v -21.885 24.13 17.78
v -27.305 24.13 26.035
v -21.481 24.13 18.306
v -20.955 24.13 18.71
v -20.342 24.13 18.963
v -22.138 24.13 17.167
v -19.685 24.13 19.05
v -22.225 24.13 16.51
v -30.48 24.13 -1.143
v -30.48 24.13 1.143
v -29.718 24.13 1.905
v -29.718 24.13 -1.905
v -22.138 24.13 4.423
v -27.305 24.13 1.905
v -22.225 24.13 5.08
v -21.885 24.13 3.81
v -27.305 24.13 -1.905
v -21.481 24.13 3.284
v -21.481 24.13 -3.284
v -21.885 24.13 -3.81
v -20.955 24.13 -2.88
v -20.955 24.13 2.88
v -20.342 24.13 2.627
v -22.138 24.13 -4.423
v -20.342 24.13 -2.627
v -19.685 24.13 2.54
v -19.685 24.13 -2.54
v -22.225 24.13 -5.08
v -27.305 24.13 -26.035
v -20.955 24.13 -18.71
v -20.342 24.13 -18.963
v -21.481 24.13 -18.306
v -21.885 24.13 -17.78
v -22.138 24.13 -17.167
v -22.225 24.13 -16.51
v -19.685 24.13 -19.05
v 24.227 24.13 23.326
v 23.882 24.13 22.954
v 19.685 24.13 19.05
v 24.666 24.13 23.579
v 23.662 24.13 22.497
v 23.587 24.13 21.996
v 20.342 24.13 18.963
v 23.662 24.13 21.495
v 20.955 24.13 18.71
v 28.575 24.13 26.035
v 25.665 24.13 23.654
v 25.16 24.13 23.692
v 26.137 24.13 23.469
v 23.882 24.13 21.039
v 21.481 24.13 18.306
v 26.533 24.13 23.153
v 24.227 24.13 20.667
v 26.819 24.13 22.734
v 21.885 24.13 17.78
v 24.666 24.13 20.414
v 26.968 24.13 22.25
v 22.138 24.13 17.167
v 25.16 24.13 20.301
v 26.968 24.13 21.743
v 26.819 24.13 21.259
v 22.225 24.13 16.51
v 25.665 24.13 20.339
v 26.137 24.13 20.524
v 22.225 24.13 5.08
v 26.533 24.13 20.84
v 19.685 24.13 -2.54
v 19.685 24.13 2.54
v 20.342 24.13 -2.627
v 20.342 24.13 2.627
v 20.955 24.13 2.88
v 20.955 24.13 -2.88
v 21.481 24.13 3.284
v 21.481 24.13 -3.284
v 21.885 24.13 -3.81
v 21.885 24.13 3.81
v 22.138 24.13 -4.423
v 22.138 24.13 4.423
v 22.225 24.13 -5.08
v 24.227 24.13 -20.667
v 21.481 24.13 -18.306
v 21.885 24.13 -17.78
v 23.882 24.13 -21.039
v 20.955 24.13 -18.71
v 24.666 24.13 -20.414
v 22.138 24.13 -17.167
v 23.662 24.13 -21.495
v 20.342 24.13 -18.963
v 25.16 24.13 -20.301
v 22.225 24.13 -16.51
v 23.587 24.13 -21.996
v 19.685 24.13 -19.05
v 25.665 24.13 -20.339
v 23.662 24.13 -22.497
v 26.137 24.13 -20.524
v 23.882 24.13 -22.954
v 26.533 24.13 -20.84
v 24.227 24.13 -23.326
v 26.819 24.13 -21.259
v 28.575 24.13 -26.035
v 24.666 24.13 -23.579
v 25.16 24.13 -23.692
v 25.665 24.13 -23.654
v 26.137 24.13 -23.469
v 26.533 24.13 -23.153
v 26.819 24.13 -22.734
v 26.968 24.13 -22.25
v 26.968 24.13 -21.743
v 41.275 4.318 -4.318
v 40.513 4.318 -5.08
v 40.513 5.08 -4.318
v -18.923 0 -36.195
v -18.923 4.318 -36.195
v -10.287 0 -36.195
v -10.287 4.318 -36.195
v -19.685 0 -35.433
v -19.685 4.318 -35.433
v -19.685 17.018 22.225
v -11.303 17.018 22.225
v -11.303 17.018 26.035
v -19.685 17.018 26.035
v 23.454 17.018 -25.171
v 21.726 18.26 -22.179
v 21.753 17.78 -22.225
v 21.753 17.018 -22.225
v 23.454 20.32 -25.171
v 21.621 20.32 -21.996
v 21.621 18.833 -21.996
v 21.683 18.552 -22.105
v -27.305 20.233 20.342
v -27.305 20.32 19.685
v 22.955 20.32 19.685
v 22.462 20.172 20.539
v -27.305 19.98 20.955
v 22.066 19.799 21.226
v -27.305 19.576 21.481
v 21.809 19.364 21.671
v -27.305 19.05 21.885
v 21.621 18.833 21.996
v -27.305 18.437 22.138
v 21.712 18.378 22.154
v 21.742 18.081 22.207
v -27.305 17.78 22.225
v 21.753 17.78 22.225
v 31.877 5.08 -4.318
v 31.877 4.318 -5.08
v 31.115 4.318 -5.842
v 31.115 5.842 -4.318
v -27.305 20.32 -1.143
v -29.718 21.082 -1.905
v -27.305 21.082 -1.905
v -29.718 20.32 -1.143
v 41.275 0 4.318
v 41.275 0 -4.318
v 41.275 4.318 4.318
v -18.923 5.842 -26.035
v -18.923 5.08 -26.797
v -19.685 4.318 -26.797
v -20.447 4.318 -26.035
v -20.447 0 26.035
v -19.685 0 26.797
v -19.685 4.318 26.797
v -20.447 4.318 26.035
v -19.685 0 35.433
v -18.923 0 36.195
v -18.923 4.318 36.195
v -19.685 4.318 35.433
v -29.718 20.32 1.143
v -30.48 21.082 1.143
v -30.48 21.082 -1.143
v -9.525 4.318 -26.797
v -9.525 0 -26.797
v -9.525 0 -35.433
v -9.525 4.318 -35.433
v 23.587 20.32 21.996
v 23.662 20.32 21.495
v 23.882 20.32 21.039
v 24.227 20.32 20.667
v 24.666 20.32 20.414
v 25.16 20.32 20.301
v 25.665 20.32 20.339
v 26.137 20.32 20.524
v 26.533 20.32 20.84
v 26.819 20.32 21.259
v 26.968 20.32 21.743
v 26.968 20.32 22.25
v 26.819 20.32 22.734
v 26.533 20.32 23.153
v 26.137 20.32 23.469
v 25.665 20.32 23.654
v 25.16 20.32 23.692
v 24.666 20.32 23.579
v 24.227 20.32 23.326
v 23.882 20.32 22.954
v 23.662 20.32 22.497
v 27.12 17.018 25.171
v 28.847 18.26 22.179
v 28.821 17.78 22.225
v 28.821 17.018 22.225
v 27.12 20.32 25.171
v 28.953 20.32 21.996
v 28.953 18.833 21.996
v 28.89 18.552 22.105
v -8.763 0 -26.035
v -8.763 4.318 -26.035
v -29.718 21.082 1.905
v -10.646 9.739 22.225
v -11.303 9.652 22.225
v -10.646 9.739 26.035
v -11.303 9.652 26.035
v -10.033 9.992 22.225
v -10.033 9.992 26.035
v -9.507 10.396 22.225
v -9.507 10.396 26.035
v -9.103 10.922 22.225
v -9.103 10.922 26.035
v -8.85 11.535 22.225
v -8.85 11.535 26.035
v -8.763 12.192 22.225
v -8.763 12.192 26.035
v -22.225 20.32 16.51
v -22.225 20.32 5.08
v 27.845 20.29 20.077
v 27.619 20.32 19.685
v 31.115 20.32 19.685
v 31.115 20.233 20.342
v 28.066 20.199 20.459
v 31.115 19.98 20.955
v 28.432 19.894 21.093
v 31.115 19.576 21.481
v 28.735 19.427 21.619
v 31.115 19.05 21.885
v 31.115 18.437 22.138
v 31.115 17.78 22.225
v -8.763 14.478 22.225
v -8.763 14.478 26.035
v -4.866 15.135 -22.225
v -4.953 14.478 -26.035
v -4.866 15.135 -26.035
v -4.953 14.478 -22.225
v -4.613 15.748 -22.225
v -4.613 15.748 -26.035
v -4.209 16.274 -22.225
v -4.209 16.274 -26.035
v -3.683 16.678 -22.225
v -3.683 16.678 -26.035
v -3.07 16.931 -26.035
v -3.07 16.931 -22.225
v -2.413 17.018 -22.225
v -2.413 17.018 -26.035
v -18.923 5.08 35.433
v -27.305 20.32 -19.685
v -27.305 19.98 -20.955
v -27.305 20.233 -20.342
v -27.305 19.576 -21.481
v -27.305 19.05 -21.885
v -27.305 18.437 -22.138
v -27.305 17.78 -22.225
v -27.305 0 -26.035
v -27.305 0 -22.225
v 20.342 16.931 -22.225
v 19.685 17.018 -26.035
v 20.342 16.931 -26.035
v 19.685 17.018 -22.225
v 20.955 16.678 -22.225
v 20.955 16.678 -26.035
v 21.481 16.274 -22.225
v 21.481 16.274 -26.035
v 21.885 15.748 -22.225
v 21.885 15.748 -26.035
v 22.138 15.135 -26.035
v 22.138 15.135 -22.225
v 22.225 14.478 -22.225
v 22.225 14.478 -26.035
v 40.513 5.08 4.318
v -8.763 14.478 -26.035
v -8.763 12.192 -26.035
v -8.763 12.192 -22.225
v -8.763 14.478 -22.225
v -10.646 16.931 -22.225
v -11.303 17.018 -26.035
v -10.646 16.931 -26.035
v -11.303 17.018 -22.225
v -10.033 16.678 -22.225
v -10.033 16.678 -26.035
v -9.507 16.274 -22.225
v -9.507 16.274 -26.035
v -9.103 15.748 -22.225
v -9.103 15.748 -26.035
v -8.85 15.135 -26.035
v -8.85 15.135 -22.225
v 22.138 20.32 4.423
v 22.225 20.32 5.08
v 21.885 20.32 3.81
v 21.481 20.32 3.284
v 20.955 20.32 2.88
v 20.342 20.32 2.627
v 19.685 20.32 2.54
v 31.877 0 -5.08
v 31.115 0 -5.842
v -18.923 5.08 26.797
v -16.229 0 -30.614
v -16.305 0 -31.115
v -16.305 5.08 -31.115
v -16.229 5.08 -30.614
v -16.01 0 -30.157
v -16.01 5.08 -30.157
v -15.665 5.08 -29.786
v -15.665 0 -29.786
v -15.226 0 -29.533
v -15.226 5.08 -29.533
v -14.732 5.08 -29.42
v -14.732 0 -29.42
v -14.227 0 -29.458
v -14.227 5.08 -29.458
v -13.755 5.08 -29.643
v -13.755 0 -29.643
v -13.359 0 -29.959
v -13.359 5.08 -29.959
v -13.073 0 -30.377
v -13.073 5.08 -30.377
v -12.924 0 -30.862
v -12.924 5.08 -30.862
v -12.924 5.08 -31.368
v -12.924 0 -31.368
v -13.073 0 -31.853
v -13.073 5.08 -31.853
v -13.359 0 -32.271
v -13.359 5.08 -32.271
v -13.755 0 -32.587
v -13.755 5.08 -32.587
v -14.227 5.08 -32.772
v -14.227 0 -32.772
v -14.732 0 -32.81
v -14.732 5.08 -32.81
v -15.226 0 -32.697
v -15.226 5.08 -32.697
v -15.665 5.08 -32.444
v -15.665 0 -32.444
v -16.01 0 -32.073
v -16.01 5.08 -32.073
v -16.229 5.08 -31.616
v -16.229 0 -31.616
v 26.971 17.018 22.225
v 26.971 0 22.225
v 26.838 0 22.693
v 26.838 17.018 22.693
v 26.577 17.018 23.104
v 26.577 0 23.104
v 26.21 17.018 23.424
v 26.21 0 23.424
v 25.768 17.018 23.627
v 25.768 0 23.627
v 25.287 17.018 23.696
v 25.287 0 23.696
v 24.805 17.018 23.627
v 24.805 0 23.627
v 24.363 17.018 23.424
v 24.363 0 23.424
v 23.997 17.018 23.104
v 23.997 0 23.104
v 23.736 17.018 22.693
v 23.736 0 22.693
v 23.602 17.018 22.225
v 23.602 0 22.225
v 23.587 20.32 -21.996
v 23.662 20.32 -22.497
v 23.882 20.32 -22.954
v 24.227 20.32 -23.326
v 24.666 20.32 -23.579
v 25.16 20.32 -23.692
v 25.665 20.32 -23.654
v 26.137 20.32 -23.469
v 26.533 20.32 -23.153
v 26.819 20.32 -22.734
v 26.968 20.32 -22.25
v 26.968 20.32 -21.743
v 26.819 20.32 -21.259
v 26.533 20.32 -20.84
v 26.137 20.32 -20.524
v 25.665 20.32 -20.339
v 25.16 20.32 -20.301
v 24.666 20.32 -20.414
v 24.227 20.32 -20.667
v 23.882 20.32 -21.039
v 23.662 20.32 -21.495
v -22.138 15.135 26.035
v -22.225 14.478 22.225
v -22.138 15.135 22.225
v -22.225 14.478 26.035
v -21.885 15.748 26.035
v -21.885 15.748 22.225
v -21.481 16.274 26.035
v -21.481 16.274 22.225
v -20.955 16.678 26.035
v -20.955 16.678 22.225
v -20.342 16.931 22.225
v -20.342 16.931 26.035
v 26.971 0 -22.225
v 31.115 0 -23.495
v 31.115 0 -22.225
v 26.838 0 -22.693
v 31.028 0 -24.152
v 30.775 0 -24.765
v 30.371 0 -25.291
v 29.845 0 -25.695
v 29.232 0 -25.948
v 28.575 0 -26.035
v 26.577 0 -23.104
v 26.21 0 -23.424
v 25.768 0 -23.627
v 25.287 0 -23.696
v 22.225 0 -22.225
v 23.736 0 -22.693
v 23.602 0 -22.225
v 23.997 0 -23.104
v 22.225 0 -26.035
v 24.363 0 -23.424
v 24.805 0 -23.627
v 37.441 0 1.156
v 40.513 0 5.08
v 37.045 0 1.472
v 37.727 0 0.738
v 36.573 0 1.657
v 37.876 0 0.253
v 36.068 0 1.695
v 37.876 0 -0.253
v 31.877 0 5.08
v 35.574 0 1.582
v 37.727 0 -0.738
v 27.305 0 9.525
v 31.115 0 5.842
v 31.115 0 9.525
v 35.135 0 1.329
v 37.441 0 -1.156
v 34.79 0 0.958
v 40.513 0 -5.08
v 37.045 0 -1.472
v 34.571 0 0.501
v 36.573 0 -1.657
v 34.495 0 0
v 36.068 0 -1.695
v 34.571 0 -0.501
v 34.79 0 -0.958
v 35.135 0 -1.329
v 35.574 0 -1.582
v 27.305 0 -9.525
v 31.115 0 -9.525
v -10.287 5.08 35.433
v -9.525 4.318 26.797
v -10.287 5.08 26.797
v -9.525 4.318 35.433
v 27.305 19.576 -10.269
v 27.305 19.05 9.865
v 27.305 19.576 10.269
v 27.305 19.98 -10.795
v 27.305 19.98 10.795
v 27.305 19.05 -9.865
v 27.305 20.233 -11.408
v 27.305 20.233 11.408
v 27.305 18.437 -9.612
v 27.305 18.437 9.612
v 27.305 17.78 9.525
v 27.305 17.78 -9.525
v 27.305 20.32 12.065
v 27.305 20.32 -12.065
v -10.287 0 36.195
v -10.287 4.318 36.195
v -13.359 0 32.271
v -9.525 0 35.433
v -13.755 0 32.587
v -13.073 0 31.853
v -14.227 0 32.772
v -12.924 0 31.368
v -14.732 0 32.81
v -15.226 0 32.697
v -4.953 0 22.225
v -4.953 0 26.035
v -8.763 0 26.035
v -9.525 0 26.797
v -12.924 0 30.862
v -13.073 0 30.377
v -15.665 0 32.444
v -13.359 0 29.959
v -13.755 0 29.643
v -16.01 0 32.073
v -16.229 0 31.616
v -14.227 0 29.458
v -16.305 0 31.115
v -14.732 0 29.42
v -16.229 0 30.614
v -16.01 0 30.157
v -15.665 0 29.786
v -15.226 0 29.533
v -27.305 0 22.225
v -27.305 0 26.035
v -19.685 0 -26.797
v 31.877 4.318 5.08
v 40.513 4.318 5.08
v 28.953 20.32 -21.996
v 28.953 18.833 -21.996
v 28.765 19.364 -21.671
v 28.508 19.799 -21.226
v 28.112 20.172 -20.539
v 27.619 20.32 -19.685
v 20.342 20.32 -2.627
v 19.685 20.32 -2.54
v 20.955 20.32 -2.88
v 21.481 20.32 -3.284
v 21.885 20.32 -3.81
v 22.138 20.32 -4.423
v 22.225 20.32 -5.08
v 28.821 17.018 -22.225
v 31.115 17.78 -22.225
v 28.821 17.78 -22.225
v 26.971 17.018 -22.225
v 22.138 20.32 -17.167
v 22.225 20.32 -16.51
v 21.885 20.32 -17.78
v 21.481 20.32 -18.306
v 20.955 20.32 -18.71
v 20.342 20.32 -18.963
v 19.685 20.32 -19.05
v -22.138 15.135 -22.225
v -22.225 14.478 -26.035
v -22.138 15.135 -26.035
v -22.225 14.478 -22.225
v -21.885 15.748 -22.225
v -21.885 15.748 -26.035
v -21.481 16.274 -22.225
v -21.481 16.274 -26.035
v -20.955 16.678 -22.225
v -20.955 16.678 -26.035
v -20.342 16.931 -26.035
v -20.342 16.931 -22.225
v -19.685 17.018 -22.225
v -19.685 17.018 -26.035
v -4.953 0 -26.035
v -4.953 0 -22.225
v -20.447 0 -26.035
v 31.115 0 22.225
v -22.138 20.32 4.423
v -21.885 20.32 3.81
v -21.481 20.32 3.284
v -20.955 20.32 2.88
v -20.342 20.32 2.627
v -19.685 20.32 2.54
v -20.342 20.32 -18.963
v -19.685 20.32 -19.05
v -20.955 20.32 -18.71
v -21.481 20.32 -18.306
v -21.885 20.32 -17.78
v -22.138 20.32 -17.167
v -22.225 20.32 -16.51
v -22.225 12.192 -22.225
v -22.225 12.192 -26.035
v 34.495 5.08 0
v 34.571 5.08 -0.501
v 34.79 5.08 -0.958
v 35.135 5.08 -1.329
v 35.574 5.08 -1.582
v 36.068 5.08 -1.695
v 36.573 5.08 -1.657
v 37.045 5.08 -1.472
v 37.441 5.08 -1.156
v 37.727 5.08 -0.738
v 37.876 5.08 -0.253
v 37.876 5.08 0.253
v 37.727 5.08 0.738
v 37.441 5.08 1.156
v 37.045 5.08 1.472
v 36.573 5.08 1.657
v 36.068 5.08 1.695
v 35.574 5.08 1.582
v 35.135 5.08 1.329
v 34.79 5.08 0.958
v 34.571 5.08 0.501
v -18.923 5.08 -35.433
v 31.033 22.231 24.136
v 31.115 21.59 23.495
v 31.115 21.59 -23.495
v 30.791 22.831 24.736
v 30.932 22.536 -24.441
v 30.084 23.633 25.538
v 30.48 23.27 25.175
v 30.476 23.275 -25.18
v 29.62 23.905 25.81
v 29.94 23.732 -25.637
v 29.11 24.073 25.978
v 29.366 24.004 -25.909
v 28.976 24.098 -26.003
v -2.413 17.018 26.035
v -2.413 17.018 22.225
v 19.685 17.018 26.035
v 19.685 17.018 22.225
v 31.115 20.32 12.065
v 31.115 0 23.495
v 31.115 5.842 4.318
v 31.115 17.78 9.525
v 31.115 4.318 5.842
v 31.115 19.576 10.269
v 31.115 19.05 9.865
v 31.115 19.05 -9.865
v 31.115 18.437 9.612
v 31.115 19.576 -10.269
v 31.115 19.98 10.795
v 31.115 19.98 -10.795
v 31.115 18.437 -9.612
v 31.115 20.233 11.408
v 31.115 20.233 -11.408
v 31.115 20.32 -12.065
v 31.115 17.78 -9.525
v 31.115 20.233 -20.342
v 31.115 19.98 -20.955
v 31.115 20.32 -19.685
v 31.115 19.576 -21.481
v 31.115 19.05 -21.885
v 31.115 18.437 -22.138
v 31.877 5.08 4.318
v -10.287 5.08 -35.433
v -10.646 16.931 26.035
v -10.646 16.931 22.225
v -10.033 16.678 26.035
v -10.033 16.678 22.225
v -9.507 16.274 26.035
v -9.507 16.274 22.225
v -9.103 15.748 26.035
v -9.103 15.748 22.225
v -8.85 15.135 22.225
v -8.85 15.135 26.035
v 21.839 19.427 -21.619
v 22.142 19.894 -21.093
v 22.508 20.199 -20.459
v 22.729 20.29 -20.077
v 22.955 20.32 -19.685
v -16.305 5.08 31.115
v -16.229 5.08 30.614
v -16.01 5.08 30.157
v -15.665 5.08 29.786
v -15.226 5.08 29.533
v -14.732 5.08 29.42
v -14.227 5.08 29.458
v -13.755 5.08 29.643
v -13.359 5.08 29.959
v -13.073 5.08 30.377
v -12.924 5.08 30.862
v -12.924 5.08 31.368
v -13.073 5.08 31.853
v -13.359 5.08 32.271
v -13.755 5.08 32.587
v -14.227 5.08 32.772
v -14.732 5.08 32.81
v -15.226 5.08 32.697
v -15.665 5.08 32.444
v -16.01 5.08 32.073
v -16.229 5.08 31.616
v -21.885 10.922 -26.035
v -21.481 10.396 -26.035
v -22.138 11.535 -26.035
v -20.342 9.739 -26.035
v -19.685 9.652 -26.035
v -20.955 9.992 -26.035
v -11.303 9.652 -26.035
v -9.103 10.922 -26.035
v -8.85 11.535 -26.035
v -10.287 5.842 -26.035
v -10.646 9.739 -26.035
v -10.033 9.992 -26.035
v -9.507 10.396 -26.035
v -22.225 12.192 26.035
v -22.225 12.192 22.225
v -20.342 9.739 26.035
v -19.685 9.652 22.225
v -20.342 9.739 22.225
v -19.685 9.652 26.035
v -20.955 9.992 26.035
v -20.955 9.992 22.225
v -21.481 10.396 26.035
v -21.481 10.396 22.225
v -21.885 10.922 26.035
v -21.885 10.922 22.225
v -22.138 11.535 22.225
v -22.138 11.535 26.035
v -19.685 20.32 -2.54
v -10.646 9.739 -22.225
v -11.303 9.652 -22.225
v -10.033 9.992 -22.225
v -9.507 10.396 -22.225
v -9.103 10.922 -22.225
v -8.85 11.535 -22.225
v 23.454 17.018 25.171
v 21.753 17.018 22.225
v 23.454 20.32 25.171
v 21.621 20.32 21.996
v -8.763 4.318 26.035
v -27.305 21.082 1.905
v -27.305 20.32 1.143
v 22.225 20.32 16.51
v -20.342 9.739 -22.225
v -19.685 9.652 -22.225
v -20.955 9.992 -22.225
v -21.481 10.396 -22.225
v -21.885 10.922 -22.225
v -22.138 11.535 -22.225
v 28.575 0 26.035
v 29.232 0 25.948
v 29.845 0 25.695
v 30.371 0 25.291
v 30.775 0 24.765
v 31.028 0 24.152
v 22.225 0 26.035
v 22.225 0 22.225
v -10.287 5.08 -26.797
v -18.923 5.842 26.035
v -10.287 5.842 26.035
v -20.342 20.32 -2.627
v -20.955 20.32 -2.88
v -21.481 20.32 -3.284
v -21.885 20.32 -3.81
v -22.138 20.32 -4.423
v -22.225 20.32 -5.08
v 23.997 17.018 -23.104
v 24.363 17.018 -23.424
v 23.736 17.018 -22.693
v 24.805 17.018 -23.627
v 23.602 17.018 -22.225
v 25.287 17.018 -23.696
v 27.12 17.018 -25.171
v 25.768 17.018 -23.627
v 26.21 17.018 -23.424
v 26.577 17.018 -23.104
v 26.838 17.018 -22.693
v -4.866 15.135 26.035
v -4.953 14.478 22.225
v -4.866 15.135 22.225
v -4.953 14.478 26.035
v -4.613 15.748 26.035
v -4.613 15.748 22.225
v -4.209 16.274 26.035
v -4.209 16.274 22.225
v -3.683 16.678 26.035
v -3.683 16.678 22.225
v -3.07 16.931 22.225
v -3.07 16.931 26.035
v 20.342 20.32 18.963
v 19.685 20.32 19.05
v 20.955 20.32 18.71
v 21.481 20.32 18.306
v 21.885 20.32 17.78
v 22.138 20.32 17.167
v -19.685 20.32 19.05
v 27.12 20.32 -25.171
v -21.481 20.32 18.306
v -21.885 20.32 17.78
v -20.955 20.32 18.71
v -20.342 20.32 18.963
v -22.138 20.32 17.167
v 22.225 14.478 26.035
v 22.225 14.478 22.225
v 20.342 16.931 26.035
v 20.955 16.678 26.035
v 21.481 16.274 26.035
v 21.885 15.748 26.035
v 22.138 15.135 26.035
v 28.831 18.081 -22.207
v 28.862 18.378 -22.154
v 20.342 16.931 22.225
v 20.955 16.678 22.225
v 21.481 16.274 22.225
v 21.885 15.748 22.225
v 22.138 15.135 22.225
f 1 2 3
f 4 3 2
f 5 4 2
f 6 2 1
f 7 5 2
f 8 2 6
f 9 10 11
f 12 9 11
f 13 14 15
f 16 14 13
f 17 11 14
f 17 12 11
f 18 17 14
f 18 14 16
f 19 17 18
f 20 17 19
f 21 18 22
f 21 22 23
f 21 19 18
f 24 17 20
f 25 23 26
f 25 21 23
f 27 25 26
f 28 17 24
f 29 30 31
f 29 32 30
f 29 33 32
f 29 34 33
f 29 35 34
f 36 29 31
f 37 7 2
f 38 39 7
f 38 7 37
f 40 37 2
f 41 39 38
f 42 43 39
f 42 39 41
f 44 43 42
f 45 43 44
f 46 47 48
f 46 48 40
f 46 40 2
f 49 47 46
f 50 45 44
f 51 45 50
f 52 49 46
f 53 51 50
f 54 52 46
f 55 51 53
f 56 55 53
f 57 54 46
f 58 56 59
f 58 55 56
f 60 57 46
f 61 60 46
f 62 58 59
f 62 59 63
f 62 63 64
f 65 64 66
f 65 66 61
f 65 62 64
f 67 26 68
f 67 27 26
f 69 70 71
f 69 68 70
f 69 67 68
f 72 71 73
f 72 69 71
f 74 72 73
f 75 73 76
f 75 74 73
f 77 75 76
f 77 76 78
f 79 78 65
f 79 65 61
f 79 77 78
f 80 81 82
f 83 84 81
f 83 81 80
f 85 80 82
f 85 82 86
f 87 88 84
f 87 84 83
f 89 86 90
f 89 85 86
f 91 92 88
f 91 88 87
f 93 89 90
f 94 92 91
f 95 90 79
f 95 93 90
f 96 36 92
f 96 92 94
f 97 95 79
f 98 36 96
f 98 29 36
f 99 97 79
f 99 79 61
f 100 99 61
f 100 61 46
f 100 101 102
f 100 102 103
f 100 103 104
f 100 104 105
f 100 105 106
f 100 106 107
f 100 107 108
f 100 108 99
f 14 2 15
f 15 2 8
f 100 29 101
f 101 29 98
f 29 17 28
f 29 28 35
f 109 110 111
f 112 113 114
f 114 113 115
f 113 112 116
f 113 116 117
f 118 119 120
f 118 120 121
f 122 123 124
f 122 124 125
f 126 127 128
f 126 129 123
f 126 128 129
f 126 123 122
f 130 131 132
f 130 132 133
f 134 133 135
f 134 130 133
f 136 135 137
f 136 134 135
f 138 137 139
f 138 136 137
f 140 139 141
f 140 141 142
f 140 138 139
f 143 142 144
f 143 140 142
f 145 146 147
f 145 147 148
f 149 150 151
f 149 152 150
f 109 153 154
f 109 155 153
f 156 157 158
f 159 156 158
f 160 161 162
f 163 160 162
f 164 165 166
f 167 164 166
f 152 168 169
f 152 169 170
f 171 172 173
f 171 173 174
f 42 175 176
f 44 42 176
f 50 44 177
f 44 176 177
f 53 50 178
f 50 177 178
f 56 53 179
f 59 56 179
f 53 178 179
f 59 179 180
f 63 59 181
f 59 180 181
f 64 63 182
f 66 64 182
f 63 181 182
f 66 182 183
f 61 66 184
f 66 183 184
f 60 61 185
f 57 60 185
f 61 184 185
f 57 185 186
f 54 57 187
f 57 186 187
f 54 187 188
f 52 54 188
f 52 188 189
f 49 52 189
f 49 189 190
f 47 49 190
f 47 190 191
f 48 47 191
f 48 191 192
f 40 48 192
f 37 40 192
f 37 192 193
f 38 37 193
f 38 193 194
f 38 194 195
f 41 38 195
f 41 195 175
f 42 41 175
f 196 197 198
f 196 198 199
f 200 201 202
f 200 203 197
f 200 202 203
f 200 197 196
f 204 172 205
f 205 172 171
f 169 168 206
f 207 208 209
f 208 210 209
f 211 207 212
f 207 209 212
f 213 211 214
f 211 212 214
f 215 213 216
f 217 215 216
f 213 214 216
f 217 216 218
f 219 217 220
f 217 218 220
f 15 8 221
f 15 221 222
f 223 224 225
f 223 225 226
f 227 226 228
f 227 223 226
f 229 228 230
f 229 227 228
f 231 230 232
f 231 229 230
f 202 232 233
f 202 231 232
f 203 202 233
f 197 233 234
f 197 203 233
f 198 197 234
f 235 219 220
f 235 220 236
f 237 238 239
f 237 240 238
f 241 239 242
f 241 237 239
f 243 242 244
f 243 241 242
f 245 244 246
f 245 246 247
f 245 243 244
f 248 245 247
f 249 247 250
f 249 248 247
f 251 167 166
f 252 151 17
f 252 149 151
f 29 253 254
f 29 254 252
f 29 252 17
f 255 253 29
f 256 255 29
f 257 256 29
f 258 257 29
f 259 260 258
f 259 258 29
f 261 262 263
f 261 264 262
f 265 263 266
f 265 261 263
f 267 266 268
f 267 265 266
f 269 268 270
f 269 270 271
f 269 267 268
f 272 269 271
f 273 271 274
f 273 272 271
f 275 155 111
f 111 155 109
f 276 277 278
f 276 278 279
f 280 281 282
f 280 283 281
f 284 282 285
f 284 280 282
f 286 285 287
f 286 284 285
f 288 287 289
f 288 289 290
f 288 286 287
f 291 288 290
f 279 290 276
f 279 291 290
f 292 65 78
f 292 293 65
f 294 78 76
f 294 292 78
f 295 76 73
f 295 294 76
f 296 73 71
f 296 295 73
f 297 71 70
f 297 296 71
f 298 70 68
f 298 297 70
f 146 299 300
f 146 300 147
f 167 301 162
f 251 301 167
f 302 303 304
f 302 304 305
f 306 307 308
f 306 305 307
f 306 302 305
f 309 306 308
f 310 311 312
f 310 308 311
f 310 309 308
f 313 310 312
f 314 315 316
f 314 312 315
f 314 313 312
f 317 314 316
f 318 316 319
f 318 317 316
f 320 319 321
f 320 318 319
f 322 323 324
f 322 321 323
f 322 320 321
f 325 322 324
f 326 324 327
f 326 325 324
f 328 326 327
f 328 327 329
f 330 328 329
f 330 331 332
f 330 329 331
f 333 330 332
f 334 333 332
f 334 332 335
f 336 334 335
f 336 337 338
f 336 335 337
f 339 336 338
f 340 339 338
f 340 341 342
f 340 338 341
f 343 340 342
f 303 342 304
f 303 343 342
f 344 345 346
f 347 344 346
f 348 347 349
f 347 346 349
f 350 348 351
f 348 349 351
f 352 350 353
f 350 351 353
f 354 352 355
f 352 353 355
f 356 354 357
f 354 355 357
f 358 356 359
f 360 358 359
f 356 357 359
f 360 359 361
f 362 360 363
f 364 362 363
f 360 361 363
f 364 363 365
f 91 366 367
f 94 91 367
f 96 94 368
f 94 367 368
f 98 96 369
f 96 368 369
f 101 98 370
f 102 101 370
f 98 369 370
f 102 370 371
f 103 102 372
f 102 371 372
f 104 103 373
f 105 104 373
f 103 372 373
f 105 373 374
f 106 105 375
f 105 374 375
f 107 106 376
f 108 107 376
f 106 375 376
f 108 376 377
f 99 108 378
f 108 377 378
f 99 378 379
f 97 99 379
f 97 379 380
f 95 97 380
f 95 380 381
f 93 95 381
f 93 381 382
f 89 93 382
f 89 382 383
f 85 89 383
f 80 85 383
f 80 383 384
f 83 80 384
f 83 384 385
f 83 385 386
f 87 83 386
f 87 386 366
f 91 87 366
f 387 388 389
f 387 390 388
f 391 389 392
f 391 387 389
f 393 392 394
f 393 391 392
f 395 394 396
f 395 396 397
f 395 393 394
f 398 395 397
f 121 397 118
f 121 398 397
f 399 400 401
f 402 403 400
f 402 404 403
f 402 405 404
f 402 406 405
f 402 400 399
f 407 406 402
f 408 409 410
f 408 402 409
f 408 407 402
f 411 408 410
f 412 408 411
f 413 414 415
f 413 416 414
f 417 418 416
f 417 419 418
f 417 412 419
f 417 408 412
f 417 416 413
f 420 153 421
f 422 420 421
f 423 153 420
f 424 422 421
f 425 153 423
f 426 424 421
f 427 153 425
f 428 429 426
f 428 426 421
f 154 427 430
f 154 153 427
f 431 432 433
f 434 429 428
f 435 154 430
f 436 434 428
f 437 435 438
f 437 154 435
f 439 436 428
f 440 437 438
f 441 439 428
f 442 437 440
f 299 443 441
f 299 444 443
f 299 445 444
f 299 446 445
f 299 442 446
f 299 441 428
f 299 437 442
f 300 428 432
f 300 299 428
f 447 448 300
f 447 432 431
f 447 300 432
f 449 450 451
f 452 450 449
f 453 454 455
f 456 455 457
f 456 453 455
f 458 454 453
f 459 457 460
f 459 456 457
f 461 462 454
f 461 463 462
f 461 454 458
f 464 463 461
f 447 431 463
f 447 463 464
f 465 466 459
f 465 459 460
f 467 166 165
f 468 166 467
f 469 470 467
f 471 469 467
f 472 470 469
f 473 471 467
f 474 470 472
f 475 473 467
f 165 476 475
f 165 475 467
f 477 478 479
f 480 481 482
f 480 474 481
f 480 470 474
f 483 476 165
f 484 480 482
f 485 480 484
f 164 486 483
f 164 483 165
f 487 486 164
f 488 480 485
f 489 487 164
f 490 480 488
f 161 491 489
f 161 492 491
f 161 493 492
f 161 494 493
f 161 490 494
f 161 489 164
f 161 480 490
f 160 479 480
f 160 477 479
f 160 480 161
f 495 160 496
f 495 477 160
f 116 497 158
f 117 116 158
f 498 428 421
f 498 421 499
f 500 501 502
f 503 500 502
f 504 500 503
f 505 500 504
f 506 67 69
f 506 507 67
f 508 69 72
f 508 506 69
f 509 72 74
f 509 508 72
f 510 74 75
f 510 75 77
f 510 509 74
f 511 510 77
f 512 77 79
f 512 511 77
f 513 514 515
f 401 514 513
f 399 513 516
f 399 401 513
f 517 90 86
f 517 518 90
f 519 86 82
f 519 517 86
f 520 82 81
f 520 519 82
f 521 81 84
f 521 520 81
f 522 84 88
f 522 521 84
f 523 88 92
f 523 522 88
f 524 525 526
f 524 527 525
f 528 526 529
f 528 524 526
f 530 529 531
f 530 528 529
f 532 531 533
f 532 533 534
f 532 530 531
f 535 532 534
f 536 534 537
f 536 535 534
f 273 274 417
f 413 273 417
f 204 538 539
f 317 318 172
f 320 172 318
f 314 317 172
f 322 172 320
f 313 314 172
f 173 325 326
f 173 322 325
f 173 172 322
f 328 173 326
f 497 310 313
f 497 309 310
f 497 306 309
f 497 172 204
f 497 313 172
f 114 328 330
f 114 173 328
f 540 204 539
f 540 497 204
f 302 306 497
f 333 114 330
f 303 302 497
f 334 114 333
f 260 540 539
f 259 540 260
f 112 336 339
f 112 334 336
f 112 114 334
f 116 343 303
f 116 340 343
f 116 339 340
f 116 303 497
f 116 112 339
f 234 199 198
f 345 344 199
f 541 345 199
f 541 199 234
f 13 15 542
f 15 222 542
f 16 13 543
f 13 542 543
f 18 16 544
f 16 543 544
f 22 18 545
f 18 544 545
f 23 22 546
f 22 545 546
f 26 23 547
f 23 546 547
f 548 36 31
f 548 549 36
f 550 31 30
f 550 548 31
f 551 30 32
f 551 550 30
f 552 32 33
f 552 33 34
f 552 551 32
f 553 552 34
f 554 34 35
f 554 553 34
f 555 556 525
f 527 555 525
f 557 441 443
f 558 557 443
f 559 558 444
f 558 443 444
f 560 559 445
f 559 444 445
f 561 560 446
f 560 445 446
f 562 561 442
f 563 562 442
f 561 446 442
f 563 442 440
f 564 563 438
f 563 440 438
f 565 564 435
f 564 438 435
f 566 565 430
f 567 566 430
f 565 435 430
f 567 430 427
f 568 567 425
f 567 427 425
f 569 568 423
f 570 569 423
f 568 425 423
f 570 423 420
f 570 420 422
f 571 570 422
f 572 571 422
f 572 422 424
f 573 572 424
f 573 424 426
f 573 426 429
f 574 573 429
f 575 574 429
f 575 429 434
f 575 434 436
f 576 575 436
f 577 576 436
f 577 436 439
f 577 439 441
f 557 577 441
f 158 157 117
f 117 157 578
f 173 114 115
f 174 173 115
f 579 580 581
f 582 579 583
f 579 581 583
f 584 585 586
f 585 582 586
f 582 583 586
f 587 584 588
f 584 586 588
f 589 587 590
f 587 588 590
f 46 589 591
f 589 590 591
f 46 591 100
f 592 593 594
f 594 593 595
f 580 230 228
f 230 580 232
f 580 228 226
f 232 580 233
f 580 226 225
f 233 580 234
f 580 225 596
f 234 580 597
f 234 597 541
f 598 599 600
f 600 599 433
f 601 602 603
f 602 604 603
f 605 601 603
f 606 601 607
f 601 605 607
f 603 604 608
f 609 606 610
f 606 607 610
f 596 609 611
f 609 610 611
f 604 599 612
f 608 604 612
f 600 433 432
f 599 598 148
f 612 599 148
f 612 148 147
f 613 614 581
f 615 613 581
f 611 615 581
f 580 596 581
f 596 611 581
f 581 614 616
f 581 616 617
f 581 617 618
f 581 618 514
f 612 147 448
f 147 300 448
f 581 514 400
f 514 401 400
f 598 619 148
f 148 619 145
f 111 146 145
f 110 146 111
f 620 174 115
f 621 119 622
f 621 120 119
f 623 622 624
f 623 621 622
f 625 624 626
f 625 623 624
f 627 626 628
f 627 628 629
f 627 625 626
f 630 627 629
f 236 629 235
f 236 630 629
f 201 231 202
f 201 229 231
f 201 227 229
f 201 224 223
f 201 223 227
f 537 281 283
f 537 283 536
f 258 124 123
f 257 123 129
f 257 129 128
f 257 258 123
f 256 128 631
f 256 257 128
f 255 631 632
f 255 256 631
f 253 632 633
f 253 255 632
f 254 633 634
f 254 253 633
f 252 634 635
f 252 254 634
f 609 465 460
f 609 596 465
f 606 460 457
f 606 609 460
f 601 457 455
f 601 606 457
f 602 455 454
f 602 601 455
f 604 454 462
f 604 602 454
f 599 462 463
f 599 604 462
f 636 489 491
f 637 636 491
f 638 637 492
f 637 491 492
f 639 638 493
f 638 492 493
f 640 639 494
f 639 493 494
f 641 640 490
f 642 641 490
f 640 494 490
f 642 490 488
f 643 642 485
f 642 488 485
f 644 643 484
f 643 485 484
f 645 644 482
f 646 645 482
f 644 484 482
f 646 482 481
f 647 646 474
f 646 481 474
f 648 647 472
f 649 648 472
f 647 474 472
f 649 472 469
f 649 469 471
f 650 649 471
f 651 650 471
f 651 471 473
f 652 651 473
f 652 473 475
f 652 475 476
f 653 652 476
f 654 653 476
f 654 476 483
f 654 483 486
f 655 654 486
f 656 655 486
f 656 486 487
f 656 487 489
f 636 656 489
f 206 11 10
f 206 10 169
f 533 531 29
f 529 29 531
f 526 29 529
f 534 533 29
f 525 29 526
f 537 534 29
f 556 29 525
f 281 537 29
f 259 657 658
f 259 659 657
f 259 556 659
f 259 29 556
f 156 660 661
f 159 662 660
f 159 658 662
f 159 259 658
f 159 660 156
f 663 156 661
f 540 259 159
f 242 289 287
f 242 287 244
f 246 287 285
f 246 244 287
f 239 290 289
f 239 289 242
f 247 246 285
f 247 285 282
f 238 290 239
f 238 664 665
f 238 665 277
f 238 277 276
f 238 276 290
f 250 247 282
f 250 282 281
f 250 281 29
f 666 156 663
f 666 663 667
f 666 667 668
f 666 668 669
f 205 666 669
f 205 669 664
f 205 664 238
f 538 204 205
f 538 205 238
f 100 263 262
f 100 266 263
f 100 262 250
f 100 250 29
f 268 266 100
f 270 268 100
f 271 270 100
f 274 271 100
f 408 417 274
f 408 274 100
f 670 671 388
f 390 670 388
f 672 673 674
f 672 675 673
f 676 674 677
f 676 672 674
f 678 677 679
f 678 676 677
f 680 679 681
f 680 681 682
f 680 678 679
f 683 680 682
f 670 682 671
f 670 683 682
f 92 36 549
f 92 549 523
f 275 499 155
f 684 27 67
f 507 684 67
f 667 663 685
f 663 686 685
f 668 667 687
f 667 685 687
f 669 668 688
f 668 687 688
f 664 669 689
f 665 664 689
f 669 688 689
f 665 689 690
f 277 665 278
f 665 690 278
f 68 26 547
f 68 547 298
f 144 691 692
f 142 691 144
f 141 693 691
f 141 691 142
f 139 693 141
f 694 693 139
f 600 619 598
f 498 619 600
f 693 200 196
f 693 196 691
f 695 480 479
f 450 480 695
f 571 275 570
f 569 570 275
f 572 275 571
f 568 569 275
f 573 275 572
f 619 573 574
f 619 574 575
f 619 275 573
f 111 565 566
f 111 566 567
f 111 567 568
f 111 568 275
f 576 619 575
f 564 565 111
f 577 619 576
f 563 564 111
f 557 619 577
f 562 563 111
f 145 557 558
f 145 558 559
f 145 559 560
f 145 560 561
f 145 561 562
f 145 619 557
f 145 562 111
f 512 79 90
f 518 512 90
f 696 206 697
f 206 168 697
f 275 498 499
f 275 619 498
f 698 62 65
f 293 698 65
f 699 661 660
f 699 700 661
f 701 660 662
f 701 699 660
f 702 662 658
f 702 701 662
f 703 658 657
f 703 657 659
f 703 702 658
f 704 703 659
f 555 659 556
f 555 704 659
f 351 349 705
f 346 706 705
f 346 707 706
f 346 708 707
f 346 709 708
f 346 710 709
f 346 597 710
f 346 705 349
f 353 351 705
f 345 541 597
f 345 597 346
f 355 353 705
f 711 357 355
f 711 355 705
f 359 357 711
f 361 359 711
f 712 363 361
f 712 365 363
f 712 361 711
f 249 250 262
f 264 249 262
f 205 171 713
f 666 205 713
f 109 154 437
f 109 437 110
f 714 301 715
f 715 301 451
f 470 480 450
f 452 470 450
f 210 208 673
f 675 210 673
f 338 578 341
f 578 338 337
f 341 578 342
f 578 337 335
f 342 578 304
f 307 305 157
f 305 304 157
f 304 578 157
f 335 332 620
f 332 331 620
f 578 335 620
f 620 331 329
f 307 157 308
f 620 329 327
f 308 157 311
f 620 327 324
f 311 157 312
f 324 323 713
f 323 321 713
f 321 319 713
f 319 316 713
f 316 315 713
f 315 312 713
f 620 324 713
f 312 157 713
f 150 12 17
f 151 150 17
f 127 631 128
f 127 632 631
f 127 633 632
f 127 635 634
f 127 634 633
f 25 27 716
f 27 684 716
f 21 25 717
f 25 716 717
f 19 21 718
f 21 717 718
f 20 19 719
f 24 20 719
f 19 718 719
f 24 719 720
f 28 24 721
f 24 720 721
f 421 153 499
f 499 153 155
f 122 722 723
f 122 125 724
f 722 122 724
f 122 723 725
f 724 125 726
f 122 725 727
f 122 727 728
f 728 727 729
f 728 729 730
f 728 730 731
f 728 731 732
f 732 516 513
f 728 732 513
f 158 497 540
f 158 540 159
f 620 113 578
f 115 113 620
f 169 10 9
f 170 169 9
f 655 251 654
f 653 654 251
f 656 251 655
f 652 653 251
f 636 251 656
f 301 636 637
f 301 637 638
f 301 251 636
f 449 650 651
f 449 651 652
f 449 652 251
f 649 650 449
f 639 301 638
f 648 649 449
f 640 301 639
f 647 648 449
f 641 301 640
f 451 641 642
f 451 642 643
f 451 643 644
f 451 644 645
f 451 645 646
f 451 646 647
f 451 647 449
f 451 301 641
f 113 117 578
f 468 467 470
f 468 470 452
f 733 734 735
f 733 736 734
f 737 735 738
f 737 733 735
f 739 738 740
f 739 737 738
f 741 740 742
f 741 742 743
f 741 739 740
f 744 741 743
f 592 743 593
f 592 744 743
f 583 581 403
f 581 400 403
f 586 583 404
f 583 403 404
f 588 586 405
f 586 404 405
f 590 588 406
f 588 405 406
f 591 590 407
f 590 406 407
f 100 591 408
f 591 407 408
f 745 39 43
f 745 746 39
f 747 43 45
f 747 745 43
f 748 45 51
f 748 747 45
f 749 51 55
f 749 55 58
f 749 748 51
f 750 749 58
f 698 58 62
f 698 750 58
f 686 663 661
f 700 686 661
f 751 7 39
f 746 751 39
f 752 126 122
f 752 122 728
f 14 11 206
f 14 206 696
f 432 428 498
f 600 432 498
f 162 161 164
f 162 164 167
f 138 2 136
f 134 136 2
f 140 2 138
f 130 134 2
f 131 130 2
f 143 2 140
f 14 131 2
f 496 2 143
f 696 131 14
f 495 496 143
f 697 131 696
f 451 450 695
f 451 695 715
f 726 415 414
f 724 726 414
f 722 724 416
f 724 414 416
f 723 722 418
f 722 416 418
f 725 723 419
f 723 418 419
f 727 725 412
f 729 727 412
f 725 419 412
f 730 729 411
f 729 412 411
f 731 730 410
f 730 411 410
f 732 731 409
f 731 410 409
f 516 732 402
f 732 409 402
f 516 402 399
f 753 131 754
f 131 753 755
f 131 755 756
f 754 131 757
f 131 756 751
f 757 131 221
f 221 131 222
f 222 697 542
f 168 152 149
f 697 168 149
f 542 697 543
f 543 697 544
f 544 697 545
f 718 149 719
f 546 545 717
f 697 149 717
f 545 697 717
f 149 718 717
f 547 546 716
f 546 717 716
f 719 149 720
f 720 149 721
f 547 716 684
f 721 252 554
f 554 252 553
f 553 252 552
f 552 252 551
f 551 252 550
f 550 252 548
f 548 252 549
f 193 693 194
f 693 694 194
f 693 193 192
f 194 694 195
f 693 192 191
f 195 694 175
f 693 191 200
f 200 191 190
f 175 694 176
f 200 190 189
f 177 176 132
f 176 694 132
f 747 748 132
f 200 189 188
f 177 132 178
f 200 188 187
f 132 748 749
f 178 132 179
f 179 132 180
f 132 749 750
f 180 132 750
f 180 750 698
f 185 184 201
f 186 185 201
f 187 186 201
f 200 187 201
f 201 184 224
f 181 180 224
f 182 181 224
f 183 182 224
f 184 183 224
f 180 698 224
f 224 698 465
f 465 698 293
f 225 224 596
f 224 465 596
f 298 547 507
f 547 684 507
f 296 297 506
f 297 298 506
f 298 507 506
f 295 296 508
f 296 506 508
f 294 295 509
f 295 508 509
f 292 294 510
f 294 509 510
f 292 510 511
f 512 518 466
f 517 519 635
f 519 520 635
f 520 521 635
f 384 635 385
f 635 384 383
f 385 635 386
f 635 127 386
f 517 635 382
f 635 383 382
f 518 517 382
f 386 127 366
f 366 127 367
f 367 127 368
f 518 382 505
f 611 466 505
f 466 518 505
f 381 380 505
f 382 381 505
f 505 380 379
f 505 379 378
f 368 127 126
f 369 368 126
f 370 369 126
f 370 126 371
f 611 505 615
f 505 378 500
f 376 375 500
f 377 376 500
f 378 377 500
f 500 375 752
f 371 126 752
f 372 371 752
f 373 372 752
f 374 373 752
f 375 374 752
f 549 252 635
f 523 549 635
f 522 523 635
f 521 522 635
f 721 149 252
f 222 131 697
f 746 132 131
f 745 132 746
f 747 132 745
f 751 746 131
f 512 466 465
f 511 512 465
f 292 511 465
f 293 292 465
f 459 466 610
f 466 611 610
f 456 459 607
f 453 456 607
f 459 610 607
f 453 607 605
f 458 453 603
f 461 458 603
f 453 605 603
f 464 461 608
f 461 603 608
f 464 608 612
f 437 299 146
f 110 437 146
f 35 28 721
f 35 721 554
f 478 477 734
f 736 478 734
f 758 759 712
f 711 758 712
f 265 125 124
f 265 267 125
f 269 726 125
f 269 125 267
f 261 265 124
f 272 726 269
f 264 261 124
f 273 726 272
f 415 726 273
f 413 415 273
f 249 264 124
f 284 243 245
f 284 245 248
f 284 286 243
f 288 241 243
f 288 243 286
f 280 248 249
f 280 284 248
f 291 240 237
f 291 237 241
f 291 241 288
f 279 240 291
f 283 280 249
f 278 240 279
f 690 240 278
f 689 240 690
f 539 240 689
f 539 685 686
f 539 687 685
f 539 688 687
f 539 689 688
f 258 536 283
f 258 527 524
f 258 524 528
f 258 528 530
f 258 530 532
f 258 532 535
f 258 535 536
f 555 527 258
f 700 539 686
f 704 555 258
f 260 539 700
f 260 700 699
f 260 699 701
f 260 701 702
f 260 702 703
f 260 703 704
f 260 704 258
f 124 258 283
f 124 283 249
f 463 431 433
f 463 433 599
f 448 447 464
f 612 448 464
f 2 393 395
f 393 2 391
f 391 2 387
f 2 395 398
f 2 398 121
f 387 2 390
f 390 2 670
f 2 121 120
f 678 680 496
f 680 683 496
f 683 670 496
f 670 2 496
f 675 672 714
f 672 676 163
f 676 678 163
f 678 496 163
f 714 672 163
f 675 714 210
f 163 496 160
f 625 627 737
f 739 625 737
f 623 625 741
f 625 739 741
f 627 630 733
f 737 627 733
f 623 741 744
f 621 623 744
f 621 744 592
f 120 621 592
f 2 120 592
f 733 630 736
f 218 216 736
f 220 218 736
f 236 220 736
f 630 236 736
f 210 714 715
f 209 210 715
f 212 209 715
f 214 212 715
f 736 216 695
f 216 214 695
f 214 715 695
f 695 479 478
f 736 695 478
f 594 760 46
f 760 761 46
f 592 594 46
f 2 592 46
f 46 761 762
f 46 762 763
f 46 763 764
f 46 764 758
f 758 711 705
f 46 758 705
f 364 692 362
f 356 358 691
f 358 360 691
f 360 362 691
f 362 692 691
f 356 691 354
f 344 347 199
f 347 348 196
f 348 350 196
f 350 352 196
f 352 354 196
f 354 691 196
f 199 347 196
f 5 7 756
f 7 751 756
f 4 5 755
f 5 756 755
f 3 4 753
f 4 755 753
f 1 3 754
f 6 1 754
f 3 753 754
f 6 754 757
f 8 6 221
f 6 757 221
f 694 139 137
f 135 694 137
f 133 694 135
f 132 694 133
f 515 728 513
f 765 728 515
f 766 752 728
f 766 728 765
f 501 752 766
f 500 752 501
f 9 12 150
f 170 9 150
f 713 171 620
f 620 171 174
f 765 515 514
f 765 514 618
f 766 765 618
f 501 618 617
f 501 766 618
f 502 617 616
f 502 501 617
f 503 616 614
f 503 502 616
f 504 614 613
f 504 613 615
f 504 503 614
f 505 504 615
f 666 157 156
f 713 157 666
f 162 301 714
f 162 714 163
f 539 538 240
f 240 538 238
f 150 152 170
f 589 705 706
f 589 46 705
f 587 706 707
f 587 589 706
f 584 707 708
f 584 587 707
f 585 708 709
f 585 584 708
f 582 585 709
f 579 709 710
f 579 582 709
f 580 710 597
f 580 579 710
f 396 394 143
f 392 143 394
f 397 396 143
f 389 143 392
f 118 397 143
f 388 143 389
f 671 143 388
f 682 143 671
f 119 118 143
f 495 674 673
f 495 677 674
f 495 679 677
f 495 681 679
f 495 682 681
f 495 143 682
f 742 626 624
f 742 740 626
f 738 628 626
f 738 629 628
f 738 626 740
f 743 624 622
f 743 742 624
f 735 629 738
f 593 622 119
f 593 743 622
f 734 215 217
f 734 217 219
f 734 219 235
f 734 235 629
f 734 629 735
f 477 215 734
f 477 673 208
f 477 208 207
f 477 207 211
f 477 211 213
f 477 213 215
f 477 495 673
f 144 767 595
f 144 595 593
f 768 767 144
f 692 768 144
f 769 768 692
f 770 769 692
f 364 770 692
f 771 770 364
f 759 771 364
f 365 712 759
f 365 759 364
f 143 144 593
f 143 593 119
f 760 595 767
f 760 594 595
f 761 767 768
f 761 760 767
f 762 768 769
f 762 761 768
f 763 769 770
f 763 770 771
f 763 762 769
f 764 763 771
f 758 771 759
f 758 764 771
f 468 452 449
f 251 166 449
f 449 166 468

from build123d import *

# Parameters (mm, degrees)
BOSS_EXTRUDE1_DEPTH      = 20.32
SKETCH2_W                = 58.42
SKETCH2_H                = 52.07
BOSS_EXTRUDE2_DEPTH      = 3.81
SKETCH3_W                = 12.7
SKETCH3_H                = 20.32
CUT_EXTRUDE1_DEPTH       = 3.81
FILLET2_R                = 2.54
SKETCH4_W                = 10.16
SKETCH4_H                = 5.08
BOSS_EXTRUDE3_DEPTH      = 10.16
CHAMFER1_SIZE            = 0.762
SKETCH5_W                = 10.16
SKETCH5_H                = 5.08
BOSS_EXTRUDE4_DEPTH      = 10.16
CHAMFER2_SIZE            = 0.762
CHAMFER2_OF_MIRROR1_SIZE = 0.762
M3_CLEARANCE_HOLE1_D     = 3.4
M3_CLEARANCE_HOLE2_D     = 3.4
CUT_EXTRUDE2_REACH       = 61.966
SKETCH13_W               = 44.45
SKETCH13_H               = 16.51
SKETCH15_W               = 13.462
SKETCH15_H               = 7.366
CUT_EXTRUDE4_DEPTH       = 79.475827011
FILLET3_R                = 2.54
SKETCH16_W               = 6.35
SKETCH16_H               = 3.81
BOSS_EXTRUDE5_DEPTH      = 3.81
CHAMFER3_SIZE            = 0.762
M3_CLEARANCE_HOLE4_D     = 3.4
CUT_EXTRUDE5_DEPTH       = 3.302


with BuildPart() as part:
    # Sketch1 → Boss-Extrude1 (new body)
    with BuildSketch(Plane(origin=(0, 0, 0), x_dir=(1, 0, 0), z_dir=(0, 1, 0))):
        Polygon((-27.305, 22.225), (-27.305, 26.035), (31.115, 26.035), (31.115, -26.035), (-27.305, -26.035), (-27.305, -22.225), (27.305, -22.225), (27.305, 22.225), align=None)
    extrude(amount=BOSS_EXTRUDE1_DEPTH)

    # Sketch2 → Boss-Extrude2 (add)
    with BuildSketch(Plane(origin=(0, 20.32, 0), x_dir=(1, 0, 0), z_dir=(0, 1, 0))):
        with Locations((1.905, 0)):
            Rectangle(SKETCH2_W, SKETCH2_H)
    extrude(amount=BOSS_EXTRUDE2_DEPTH)

    # Sketch3 → Cut-Extrude1 (cut)
    with BuildSketch(Plane.ZY.offset(-27.305)):
        with Locations((-15.875, 10.16)):
            Rectangle(SKETCH3_W, SKETCH3_H)
        with Locations((15.875, 10.16)):
            Rectangle(SKETCH3_W, SKETCH3_H)
    extrude(amount=-CUT_EXTRUDE1_DEPTH, mode=Mode.SUBTRACT)

    # Fillet2
    fillet2_edges = [part.edges().sort_by_distance(p)[0] for p in [
        (31.115, 12.065, -26.035),
        (31.115, 12.065, 26.035),
        (31.115, 24.13, 0),
    ]]
    fillet(fillet2_edges, radius=FILLET2_R)

    # Sketch4 → Boss-Extrude3 (add)
    with BuildSketch(Plane(origin=(31.115, 0, 0), x_dir=(0, 0, -1), z_dir=(1, 0, 0))):
        with Locations((0, 2.54)):
            Rectangle(SKETCH4_W, SKETCH4_H)
    extrude(amount=BOSS_EXTRUDE3_DEPTH)

    # Chamfer1
    chamfer1_edges = [part.edges().sort_by_distance(p)[0] for p in [
        (31.115, 2.54, 5.08),
        (36.195, 5.08, 5.08),
        (31.115, 2.54, -5.08),
        (31.115, 5.08, 0),
        (36.195, 5.08, -5.08),
        (41.275, 2.54, 5.08),
        (41.275, 2.54, -5.08),
        (41.275, 5.08, 0),
    ]]
    chamfer(chamfer1_edges, length=CHAMFER1_SIZE)

    # Sketch5 → Boss-Extrude4 (add)
    with BuildSketch(Plane.XY.offset(26.035)):
        with Locations((-14.605, 2.54)):
            Rectangle(SKETCH5_W, SKETCH5_H)
    boss_extrude4 = extrude(amount=BOSS_EXTRUDE4_DEPTH)

    # Chamfer2
    chamfer2_edges = [part.edges().sort_by_distance(p)[0] for p in [
        (-19.685, 2.54, 26.035),
        (-19.685, 5.08, 31.115),
        (-9.525, 2.54, 26.035),
        (-14.605, 5.08, 26.035),
        (-9.525, 5.08, 31.115),
        (-19.685, 2.54, 36.195),
        (-9.525, 2.54, 36.195),
        (-14.605, 5.08, 36.195),
    ]]
    chamfer(chamfer2_edges, length=CHAMFER2_SIZE)

    # Mirror1: Boss-Extrude4 across plane
    add(boss_extrude4.mirror(Plane.XY))

    # Chamfer2 of Mirror1
    chamfer2_of_mirror1_edges = [part.edges().sort_by_distance(p)[0] for p in [
        (-19.685, 2.54, -26.035),
        (-19.685, 5.08, -31.115),
        (-9.525, 2.54, -26.035),
        (-14.605, 5.08, -26.035),
        (-9.525, 5.08, -31.115),
        (-19.685, 2.54, -36.195),
        (-9.525, 2.54, -36.195),
        (-14.605, 5.08, -36.195),
    ]]
    chamfer(chamfer2_of_mirror1_edges, length=CHAMFER2_OF_MIRROR1_SIZE)

    # M3 Clearance Hole1 (through all)
    with Locations(Plane(origin=(0, 5.08, 0), x_dir=(1, 0, 0), z_dir=(0, 1, 0))):
        with Locations((-14.605, -31.115)):
            m3_clearance_hole1 = Hole(M3_CLEARANCE_HOLE1_D / 2)

    # Mirror2: M3 Clearance Hole1 across plane
    add(m3_clearance_hole1.mirror(Plane.XY), mode=Mode.SUBTRACT)

    # M3 Clearance Hole2 (through all)
    with Locations(Plane(origin=(0, 5.08, 0), x_dir=(1, 0, 0), z_dir=(0, 1, 0))):
        with Locations((36.195, 0)):
            Hole(M3_CLEARANCE_HOLE2_D / 2)

    # Sketch13 → Cut-Extrude2 (cut, up to next)
    with BuildSketch(Plane(origin=(0, 24.13, 0), x_dir=(1, 0, 0), z_dir=(0, 1, 0)), mode=Mode.PRIVATE) as cut_extrude2_sk1:
        with Locations((0, -10.795)):
            Rectangle(SKETCH13_W, SKETCH13_H)
    cut_extrude2_tool1 = extrude(cut_extrude2_sk1.sketch, amount=-CUT_EXTRUDE2_REACH, mode=Mode.PRIVATE) & part.part
    # Sketch13 → Cut-Extrude2 (cut, up to next)
    with BuildSketch(Plane(origin=(0, 24.13, 0), x_dir=(1, 0, 0), z_dir=(0, 1, 0)), mode=Mode.PRIVATE) as cut_extrude2_sk2:
        with Locations((0, 10.795)):
            Rectangle(SKETCH13_W, SKETCH13_H)
    cut_extrude2_tool2 = extrude(cut_extrude2_sk2.sketch, amount=-CUT_EXTRUDE2_REACH, mode=Mode.PRIVATE) & part.part
    add(cut_extrude2_tool1.solids().sort_by_distance((0, 24.13, 10.795))[0], mode=Mode.SUBTRACT)
    add(cut_extrude2_tool2.solids().sort_by_distance((0, 24.13, -10.795))[0], mode=Mode.SUBTRACT)

    # Sketch15 → Cut-Extrude4 (cut, through all)
    with BuildSketch(Plane(origin=(0, 0, -26.035), x_dir=(-1, 0, 0), z_dir=(0, 0, -1))):
        Polygon((-22.225, 0), (4.953, 0), (4.953, 9.652), (4.953, 17.018), (2.441043817, 17.018), (-22.225, 17.018), align=None)
        with Locations((15.494, 13.335)):
            Rectangle(SKETCH15_W, SKETCH15_H)
    extrude(amount=-CUT_EXTRUDE4_DEPTH, mode=Mode.SUBTRACT)

    # Fillet3
    fillet3_edges = [part.edges().sort_by_distance(p)[0] for p in [
        (-22.225, 22.225, 19.05),
        (-22.225, 22.225, 2.54),
        (1.905, 20.32, -22.225),
        (22.225, 22.225, 2.54),
        (22.225, 22.225, 19.05),
        (22.225, 22.225, -19.05),
        (22.225, 22.225, -2.54),
        (-22.225, 22.225, -2.54),
        (-22.225, 22.225, -19.05),
        (22.225, 17.018, 24.13),
        (22.225, 17.018, -24.13),
        (-4.953, 17.018, 24.13),
        (-4.953, 17.018, -24.13),
        (-22.225, 17.018, 24.13),
        (-22.225, 17.018, -24.13),
        (-22.225, 9.652, 24.13),
        (-22.225, 9.652, -24.13),
        (-8.763, 9.652, 24.13),
        (-8.763, 9.652, -24.13),
        (-8.763, 17.018, 24.13),
        (-8.763, 17.018, -24.13),
        (29.21, 20.32, -9.525),
        (29.21, 20.32, 9.525),
        (1.905, 20.32, 22.225),
    ]]
    fillet(fillet3_edges, radius=FILLET3_R)

    # Sketch16 → Boss-Extrude5 (add)
    with BuildSketch(Plane(origin=(0, 24.13, 0), x_dir=(1, 0, 0), z_dir=(0, 1, 0))):
        with Locations((-27.305, 0)):
            Rectangle(SKETCH16_W, SKETCH16_H)
    extrude(amount=-BOSS_EXTRUDE5_DEPTH)

    # Chamfer3
    chamfer3_edges = [part.edges().sort_by_distance(p)[0] for p in [
        (-28.8925, 20.32, -1.905),
        (-28.8925, 20.32, 1.905),
        (-30.48, 20.32, 0),
        (-30.48, 22.225, -1.905),
        (-30.48, 22.225, 1.905),
    ]]
    chamfer(chamfer3_edges, length=CHAMFER3_SIZE)

    # M3 Clearance Hole4 (through all)
    with Locations(Plane(origin=(0, 24.13, 0), x_dir=(1, 0, 0), z_dir=(0, 1, 0))):
        with Locations((25.286866606, -21.9964), (25.286866606, 21.9964)):
            Hole(M3_CLEARANCE_HOLE4_D / 2)

    # Sketch22 → Cut-Extrude5 (cut)
    with BuildSketch(Plane.XZ.offset(-20.32)):
        Polygon((28.953040816, 21.9964), (27.119953711, 25.1714), (23.453779502, 25.1714), (21.620692397, 21.9964), (23.453779502, 18.8214), (27.119953711, 18.8214), align=None)
        Polygon((28.953040816, -21.9964), (27.119953711, -18.8214), (23.453779502, -18.8214), (21.620692397, -21.9964), (23.453779502, -25.1714), (27.119953711, -25.1714), align=None)
    extrude(amount=CUT_EXTRUDE5_DEPTH, mode=Mode.SUBTRACT)


solid = part.part
